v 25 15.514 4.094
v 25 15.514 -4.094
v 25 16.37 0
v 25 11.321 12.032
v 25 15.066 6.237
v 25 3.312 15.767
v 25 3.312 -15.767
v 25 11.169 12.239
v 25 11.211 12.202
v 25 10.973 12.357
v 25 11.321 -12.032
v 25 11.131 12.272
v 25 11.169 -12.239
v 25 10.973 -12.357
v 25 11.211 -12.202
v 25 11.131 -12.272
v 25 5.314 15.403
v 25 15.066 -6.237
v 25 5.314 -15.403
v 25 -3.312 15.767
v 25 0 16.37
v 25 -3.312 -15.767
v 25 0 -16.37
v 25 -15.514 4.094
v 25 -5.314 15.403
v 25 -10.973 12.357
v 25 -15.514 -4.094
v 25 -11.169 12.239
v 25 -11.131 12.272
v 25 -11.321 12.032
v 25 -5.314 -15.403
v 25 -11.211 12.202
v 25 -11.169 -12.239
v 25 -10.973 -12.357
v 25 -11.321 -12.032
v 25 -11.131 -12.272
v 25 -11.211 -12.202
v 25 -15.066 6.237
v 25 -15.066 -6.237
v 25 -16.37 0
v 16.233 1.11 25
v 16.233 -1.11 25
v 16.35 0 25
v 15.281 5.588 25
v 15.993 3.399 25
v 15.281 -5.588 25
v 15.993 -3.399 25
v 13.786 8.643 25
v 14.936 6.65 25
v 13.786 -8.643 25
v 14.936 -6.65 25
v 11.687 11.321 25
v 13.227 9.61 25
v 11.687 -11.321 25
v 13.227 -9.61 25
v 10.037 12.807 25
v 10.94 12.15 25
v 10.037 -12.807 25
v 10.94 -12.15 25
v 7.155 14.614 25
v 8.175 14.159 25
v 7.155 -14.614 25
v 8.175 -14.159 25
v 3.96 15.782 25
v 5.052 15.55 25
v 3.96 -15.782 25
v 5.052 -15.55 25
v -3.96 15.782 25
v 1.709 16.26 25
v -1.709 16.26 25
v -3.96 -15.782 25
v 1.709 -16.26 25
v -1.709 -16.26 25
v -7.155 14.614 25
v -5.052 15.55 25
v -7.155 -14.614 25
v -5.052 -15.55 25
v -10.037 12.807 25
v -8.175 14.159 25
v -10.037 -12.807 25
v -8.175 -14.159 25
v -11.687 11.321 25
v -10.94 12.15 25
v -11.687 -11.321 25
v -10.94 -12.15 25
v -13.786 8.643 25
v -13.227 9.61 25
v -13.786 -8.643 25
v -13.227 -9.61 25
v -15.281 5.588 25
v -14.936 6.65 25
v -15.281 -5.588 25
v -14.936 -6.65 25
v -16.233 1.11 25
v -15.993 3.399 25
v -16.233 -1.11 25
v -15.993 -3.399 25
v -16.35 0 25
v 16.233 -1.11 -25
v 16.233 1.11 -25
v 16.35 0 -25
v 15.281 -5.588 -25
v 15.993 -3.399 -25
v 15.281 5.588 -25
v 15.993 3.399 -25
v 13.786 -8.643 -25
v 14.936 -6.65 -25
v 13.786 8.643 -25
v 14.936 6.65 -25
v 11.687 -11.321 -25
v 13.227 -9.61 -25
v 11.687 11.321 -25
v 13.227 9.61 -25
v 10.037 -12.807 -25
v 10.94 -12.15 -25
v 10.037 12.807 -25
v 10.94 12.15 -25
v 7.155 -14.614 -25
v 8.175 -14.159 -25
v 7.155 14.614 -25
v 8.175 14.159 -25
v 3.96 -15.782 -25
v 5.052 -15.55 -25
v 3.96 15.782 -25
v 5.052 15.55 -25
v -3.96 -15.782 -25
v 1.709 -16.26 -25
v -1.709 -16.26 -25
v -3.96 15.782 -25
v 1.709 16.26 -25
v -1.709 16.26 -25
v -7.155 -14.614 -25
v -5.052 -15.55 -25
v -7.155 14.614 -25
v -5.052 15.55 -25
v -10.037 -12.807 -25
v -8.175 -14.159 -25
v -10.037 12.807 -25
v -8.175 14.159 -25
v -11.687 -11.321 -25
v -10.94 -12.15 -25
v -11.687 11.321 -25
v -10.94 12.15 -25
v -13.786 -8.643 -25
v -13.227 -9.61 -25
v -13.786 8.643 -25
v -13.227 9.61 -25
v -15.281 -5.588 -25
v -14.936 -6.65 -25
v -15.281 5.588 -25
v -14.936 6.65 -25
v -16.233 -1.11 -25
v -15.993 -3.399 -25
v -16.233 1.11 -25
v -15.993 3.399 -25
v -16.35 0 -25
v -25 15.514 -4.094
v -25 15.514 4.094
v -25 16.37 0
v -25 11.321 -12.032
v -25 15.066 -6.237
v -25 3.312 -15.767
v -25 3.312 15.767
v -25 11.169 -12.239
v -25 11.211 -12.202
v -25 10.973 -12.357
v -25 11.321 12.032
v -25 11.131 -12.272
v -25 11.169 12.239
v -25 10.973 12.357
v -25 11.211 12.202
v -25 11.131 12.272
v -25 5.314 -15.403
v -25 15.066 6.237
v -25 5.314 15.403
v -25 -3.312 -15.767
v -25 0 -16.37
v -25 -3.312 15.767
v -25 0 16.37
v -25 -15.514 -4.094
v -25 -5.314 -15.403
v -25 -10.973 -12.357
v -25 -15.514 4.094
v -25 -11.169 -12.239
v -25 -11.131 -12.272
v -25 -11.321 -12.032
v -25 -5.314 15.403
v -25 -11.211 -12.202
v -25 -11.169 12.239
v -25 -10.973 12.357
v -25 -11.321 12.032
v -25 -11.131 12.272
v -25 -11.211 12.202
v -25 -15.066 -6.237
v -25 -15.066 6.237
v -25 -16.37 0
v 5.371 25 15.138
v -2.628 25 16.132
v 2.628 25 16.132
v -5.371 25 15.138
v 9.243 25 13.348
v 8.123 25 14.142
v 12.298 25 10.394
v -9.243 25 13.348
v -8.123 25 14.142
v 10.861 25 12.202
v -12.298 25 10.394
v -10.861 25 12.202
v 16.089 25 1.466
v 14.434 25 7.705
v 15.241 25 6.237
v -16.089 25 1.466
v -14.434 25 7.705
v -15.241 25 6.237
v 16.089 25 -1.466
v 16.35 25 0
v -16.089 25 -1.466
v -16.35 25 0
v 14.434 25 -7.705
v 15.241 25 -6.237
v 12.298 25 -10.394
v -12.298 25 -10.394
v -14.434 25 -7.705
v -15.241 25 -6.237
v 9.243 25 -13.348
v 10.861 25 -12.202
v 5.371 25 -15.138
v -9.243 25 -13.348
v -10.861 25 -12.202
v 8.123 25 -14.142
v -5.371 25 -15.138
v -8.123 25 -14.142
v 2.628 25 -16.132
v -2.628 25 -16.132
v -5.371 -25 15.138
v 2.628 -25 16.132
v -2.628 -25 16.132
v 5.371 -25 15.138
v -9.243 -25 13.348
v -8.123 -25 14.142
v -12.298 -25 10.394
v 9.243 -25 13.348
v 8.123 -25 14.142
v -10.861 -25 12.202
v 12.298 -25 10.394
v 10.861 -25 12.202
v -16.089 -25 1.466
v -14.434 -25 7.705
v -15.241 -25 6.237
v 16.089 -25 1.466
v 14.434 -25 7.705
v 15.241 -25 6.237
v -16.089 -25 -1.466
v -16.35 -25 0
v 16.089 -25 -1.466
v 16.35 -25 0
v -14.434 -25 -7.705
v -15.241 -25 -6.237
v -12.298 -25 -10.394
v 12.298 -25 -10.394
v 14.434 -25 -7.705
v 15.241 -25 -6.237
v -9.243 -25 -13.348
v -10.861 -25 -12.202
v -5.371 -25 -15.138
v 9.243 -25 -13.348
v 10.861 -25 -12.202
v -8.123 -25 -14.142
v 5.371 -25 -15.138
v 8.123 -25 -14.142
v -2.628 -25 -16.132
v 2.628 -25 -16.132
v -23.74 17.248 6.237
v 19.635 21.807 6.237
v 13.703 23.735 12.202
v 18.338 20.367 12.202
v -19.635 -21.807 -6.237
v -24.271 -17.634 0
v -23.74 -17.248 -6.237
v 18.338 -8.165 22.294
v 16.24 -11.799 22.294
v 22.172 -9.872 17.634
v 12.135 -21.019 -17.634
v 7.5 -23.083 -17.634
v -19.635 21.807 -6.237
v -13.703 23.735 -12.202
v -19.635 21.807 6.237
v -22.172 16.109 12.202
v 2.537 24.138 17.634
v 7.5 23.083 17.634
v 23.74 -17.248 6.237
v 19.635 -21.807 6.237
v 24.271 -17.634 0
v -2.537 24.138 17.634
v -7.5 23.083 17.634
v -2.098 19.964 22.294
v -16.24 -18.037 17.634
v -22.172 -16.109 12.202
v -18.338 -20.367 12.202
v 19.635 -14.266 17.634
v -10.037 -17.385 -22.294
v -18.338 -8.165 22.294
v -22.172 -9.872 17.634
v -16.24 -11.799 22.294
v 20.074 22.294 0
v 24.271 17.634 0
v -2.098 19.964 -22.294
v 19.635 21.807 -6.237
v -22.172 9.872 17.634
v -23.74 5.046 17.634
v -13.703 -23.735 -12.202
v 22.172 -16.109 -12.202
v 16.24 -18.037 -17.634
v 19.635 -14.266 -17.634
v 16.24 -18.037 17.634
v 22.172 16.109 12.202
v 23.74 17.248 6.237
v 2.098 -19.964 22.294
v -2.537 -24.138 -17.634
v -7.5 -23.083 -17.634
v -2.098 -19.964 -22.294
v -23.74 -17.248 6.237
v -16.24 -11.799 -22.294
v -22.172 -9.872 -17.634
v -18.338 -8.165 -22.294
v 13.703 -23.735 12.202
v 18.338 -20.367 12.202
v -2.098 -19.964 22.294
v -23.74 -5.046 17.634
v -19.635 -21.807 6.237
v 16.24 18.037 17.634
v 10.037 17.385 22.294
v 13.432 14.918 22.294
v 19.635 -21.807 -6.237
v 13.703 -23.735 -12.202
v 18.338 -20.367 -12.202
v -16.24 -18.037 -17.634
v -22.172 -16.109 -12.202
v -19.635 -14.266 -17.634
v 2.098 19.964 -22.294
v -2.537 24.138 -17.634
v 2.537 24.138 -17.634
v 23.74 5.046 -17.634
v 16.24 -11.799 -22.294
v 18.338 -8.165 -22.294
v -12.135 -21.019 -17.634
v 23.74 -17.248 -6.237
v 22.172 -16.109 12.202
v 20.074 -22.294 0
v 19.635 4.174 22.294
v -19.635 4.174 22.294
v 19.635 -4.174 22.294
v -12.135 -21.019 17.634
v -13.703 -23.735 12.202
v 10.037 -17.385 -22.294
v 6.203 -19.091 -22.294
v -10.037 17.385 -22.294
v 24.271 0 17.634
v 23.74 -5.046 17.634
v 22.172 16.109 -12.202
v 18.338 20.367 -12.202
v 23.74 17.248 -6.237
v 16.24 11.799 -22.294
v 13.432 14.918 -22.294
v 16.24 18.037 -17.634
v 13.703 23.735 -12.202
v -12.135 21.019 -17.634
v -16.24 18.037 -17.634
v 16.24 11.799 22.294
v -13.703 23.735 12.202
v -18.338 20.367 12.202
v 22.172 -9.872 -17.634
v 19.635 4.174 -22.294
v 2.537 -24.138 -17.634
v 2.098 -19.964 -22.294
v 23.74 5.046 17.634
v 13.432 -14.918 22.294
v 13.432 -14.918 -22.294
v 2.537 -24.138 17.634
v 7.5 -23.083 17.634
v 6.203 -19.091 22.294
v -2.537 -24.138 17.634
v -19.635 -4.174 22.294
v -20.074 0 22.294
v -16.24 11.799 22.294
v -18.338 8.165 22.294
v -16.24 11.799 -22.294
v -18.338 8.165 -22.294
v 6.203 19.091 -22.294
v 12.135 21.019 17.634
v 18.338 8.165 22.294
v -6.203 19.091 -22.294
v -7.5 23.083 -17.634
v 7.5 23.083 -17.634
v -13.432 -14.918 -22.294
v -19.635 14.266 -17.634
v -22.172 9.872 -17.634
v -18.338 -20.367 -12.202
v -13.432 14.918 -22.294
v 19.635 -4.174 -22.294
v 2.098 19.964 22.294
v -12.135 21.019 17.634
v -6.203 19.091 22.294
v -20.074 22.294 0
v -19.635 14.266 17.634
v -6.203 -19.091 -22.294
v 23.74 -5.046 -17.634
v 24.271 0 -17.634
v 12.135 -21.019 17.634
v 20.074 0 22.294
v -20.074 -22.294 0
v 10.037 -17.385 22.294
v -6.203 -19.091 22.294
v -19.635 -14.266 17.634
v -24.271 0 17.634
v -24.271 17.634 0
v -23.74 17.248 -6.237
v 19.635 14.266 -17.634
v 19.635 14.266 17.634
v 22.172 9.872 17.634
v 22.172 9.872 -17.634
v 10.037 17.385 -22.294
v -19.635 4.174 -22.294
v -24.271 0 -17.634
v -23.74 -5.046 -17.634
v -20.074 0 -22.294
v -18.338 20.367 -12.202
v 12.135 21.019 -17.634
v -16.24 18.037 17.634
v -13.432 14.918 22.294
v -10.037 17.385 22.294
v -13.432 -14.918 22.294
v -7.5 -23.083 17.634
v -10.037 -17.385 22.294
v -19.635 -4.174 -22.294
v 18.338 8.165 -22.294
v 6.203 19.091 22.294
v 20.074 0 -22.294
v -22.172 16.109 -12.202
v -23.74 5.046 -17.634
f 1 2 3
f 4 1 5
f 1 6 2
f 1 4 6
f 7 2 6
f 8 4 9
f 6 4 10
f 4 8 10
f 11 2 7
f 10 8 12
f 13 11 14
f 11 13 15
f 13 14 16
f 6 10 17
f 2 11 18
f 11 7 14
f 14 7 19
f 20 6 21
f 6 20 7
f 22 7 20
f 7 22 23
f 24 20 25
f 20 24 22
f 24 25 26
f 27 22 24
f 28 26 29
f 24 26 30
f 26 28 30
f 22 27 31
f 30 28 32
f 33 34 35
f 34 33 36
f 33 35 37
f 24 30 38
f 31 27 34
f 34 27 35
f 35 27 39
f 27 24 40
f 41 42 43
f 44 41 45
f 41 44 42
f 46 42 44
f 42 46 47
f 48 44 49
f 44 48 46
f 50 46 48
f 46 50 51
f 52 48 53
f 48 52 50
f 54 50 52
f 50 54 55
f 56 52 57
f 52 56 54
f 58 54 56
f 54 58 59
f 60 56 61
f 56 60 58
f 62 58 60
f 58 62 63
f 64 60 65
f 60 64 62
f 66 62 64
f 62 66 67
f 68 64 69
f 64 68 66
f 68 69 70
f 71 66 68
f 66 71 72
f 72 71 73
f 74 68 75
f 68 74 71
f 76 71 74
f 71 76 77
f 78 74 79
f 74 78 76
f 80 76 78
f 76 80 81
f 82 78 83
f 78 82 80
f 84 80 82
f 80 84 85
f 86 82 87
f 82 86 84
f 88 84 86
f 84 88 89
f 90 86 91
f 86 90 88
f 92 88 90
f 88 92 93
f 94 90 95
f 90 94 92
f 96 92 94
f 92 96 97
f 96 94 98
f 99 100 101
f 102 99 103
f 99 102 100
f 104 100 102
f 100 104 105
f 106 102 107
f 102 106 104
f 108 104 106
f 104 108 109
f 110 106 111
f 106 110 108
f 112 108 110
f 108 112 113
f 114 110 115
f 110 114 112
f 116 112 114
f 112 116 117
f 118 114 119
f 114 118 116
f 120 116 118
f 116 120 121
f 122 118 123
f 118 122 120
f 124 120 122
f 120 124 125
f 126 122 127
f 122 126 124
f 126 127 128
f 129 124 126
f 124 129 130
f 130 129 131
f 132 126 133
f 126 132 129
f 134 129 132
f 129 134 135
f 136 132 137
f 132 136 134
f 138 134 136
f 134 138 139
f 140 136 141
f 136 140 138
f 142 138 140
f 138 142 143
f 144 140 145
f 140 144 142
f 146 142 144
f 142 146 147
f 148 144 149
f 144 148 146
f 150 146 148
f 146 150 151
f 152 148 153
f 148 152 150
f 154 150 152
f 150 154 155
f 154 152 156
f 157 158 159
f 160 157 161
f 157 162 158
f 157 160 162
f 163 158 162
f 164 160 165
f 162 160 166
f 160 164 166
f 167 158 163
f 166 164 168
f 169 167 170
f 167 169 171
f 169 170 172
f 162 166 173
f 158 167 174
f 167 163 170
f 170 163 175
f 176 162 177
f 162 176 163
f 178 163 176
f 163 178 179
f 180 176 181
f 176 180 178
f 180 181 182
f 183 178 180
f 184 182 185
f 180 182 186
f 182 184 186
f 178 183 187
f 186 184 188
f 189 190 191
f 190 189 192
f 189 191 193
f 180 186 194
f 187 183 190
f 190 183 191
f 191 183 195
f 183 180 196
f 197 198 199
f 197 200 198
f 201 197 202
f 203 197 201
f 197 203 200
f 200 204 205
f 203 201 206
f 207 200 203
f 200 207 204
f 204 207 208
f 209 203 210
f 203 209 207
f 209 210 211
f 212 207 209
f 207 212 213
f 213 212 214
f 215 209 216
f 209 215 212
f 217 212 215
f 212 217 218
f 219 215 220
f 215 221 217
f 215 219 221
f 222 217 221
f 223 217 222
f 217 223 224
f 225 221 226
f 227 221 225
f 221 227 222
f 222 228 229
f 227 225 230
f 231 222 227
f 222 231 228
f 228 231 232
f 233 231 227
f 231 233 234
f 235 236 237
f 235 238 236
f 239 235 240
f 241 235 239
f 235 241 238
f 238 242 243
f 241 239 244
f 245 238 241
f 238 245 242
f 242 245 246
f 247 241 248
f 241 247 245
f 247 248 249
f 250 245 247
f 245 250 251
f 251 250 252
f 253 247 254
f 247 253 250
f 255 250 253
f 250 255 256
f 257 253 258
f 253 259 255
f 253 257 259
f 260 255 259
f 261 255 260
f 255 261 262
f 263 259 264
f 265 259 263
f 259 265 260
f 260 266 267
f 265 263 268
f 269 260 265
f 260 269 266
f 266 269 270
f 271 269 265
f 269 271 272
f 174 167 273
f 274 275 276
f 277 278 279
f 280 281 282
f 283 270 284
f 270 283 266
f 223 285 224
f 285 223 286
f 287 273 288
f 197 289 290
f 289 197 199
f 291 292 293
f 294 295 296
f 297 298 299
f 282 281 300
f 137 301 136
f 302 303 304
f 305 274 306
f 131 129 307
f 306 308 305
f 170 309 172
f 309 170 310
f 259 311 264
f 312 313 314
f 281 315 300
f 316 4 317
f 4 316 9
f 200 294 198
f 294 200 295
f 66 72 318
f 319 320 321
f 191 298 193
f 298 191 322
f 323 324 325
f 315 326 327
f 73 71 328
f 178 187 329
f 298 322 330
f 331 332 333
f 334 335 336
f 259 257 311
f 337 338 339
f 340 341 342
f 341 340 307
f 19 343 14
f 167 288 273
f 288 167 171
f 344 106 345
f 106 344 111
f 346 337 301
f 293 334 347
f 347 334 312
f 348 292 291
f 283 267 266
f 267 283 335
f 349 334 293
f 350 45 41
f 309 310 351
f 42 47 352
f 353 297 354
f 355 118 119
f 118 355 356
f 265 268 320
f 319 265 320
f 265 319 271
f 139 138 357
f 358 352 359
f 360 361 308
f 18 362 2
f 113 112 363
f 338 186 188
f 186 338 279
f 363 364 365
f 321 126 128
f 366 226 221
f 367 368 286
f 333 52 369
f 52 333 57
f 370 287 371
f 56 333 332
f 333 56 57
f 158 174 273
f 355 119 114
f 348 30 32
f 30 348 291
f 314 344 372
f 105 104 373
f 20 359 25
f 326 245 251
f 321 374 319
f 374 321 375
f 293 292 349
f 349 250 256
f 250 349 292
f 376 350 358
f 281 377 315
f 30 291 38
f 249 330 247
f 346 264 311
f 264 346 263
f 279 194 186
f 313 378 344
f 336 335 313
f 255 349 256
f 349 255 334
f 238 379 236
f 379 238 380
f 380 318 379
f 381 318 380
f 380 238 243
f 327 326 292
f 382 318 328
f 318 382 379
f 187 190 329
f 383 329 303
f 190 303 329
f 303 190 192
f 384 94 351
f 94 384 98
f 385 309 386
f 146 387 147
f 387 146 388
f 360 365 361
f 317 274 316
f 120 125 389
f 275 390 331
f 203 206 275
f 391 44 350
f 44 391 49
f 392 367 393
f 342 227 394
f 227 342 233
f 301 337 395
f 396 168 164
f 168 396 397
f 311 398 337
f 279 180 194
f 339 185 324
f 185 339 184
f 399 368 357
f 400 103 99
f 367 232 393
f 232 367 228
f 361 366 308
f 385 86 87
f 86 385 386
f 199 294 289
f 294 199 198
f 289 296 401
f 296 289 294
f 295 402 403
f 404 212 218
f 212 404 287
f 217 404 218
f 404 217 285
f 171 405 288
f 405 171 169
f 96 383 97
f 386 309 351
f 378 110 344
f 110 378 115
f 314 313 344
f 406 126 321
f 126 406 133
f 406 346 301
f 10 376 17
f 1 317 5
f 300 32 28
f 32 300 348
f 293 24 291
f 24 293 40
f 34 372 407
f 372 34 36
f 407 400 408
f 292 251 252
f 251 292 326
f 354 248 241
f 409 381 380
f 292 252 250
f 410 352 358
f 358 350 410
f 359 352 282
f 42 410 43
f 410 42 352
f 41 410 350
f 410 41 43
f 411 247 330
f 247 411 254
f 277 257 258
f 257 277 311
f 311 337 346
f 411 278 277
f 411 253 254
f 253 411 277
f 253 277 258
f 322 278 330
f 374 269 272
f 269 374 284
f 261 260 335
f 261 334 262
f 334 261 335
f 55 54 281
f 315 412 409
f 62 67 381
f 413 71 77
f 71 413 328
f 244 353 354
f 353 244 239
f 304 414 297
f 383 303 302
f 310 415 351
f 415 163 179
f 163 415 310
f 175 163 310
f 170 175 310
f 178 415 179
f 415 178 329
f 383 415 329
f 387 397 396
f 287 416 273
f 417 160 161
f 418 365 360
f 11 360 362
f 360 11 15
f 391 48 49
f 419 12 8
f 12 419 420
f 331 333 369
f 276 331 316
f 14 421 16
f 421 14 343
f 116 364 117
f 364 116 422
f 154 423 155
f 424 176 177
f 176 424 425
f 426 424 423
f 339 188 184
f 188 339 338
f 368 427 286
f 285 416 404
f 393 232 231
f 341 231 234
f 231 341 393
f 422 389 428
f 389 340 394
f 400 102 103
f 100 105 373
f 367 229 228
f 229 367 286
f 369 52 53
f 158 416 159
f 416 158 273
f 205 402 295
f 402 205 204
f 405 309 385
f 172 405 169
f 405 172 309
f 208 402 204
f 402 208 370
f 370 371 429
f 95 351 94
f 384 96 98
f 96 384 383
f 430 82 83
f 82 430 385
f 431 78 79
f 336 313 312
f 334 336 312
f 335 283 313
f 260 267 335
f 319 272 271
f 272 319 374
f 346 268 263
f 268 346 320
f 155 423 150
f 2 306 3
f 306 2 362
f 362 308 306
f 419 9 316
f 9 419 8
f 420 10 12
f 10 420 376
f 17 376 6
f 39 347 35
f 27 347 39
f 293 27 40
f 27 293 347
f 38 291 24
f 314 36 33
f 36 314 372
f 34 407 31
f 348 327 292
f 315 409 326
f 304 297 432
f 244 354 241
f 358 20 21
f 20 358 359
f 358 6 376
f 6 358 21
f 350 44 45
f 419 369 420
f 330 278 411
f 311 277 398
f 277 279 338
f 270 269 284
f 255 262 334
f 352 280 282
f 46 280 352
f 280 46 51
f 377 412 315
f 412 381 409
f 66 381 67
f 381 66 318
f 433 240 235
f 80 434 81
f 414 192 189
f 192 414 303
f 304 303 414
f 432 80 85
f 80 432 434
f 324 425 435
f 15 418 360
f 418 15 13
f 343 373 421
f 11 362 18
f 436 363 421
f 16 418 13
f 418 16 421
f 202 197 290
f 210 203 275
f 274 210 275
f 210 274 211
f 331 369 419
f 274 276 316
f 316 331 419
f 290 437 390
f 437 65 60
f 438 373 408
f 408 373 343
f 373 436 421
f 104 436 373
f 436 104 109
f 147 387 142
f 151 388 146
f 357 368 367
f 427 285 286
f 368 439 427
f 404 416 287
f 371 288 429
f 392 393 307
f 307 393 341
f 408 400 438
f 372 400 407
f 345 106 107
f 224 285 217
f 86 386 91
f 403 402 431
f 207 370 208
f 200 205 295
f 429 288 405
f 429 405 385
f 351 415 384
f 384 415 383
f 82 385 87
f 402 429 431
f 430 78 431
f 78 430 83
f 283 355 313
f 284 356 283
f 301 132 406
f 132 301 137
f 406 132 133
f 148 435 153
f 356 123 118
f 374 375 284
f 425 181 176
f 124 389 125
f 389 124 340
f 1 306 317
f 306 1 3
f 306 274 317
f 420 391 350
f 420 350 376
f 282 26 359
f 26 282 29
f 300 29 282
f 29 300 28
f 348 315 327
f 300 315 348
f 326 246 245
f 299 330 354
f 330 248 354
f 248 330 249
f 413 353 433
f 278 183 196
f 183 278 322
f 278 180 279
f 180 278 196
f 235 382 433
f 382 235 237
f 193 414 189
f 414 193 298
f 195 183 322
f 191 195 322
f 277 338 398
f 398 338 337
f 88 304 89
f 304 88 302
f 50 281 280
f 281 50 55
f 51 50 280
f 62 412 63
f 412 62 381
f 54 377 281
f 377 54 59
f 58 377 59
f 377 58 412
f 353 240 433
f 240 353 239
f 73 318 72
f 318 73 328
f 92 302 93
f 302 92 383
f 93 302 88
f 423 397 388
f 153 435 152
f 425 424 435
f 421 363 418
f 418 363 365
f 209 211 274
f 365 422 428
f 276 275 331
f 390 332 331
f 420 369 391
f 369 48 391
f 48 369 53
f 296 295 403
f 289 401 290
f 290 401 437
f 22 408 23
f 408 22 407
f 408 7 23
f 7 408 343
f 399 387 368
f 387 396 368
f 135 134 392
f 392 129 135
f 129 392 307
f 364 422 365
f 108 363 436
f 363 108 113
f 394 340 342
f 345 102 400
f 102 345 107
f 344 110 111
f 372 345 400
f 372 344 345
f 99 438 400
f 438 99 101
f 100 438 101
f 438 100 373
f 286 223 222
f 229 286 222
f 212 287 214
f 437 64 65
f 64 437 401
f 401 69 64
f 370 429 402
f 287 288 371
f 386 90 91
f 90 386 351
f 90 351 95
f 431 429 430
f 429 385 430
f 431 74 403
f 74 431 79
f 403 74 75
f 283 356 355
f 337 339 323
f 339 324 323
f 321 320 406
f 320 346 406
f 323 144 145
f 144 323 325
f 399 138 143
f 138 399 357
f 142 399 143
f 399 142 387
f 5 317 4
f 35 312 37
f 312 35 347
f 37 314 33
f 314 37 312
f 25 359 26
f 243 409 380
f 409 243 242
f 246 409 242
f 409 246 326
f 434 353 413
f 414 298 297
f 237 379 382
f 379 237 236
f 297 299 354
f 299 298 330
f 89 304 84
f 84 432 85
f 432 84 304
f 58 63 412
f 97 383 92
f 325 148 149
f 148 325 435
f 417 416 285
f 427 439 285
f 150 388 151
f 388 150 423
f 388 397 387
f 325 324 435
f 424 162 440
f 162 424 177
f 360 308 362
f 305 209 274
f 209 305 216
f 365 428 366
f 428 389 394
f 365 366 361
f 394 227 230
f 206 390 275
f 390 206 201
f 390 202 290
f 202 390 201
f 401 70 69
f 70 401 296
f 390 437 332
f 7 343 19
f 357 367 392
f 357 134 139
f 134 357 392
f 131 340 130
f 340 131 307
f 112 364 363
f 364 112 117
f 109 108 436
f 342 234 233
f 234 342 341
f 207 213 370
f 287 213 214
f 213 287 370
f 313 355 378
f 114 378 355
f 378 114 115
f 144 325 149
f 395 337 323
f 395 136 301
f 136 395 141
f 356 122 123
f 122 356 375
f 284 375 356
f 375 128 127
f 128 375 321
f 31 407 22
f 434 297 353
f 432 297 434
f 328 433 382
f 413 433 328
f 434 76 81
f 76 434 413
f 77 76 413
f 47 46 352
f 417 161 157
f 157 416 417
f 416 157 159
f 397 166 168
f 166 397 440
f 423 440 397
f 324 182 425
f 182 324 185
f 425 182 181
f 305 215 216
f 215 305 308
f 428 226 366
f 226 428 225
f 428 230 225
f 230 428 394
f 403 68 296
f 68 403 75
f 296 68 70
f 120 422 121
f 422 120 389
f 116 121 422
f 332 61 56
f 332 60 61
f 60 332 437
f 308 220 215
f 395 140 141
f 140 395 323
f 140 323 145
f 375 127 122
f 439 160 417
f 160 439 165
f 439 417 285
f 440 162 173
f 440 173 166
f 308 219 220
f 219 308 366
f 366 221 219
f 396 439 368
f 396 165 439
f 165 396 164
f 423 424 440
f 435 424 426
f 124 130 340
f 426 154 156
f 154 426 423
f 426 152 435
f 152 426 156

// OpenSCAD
 intersection() {
    cube(50, center=true);
    sphere(30);
  }
